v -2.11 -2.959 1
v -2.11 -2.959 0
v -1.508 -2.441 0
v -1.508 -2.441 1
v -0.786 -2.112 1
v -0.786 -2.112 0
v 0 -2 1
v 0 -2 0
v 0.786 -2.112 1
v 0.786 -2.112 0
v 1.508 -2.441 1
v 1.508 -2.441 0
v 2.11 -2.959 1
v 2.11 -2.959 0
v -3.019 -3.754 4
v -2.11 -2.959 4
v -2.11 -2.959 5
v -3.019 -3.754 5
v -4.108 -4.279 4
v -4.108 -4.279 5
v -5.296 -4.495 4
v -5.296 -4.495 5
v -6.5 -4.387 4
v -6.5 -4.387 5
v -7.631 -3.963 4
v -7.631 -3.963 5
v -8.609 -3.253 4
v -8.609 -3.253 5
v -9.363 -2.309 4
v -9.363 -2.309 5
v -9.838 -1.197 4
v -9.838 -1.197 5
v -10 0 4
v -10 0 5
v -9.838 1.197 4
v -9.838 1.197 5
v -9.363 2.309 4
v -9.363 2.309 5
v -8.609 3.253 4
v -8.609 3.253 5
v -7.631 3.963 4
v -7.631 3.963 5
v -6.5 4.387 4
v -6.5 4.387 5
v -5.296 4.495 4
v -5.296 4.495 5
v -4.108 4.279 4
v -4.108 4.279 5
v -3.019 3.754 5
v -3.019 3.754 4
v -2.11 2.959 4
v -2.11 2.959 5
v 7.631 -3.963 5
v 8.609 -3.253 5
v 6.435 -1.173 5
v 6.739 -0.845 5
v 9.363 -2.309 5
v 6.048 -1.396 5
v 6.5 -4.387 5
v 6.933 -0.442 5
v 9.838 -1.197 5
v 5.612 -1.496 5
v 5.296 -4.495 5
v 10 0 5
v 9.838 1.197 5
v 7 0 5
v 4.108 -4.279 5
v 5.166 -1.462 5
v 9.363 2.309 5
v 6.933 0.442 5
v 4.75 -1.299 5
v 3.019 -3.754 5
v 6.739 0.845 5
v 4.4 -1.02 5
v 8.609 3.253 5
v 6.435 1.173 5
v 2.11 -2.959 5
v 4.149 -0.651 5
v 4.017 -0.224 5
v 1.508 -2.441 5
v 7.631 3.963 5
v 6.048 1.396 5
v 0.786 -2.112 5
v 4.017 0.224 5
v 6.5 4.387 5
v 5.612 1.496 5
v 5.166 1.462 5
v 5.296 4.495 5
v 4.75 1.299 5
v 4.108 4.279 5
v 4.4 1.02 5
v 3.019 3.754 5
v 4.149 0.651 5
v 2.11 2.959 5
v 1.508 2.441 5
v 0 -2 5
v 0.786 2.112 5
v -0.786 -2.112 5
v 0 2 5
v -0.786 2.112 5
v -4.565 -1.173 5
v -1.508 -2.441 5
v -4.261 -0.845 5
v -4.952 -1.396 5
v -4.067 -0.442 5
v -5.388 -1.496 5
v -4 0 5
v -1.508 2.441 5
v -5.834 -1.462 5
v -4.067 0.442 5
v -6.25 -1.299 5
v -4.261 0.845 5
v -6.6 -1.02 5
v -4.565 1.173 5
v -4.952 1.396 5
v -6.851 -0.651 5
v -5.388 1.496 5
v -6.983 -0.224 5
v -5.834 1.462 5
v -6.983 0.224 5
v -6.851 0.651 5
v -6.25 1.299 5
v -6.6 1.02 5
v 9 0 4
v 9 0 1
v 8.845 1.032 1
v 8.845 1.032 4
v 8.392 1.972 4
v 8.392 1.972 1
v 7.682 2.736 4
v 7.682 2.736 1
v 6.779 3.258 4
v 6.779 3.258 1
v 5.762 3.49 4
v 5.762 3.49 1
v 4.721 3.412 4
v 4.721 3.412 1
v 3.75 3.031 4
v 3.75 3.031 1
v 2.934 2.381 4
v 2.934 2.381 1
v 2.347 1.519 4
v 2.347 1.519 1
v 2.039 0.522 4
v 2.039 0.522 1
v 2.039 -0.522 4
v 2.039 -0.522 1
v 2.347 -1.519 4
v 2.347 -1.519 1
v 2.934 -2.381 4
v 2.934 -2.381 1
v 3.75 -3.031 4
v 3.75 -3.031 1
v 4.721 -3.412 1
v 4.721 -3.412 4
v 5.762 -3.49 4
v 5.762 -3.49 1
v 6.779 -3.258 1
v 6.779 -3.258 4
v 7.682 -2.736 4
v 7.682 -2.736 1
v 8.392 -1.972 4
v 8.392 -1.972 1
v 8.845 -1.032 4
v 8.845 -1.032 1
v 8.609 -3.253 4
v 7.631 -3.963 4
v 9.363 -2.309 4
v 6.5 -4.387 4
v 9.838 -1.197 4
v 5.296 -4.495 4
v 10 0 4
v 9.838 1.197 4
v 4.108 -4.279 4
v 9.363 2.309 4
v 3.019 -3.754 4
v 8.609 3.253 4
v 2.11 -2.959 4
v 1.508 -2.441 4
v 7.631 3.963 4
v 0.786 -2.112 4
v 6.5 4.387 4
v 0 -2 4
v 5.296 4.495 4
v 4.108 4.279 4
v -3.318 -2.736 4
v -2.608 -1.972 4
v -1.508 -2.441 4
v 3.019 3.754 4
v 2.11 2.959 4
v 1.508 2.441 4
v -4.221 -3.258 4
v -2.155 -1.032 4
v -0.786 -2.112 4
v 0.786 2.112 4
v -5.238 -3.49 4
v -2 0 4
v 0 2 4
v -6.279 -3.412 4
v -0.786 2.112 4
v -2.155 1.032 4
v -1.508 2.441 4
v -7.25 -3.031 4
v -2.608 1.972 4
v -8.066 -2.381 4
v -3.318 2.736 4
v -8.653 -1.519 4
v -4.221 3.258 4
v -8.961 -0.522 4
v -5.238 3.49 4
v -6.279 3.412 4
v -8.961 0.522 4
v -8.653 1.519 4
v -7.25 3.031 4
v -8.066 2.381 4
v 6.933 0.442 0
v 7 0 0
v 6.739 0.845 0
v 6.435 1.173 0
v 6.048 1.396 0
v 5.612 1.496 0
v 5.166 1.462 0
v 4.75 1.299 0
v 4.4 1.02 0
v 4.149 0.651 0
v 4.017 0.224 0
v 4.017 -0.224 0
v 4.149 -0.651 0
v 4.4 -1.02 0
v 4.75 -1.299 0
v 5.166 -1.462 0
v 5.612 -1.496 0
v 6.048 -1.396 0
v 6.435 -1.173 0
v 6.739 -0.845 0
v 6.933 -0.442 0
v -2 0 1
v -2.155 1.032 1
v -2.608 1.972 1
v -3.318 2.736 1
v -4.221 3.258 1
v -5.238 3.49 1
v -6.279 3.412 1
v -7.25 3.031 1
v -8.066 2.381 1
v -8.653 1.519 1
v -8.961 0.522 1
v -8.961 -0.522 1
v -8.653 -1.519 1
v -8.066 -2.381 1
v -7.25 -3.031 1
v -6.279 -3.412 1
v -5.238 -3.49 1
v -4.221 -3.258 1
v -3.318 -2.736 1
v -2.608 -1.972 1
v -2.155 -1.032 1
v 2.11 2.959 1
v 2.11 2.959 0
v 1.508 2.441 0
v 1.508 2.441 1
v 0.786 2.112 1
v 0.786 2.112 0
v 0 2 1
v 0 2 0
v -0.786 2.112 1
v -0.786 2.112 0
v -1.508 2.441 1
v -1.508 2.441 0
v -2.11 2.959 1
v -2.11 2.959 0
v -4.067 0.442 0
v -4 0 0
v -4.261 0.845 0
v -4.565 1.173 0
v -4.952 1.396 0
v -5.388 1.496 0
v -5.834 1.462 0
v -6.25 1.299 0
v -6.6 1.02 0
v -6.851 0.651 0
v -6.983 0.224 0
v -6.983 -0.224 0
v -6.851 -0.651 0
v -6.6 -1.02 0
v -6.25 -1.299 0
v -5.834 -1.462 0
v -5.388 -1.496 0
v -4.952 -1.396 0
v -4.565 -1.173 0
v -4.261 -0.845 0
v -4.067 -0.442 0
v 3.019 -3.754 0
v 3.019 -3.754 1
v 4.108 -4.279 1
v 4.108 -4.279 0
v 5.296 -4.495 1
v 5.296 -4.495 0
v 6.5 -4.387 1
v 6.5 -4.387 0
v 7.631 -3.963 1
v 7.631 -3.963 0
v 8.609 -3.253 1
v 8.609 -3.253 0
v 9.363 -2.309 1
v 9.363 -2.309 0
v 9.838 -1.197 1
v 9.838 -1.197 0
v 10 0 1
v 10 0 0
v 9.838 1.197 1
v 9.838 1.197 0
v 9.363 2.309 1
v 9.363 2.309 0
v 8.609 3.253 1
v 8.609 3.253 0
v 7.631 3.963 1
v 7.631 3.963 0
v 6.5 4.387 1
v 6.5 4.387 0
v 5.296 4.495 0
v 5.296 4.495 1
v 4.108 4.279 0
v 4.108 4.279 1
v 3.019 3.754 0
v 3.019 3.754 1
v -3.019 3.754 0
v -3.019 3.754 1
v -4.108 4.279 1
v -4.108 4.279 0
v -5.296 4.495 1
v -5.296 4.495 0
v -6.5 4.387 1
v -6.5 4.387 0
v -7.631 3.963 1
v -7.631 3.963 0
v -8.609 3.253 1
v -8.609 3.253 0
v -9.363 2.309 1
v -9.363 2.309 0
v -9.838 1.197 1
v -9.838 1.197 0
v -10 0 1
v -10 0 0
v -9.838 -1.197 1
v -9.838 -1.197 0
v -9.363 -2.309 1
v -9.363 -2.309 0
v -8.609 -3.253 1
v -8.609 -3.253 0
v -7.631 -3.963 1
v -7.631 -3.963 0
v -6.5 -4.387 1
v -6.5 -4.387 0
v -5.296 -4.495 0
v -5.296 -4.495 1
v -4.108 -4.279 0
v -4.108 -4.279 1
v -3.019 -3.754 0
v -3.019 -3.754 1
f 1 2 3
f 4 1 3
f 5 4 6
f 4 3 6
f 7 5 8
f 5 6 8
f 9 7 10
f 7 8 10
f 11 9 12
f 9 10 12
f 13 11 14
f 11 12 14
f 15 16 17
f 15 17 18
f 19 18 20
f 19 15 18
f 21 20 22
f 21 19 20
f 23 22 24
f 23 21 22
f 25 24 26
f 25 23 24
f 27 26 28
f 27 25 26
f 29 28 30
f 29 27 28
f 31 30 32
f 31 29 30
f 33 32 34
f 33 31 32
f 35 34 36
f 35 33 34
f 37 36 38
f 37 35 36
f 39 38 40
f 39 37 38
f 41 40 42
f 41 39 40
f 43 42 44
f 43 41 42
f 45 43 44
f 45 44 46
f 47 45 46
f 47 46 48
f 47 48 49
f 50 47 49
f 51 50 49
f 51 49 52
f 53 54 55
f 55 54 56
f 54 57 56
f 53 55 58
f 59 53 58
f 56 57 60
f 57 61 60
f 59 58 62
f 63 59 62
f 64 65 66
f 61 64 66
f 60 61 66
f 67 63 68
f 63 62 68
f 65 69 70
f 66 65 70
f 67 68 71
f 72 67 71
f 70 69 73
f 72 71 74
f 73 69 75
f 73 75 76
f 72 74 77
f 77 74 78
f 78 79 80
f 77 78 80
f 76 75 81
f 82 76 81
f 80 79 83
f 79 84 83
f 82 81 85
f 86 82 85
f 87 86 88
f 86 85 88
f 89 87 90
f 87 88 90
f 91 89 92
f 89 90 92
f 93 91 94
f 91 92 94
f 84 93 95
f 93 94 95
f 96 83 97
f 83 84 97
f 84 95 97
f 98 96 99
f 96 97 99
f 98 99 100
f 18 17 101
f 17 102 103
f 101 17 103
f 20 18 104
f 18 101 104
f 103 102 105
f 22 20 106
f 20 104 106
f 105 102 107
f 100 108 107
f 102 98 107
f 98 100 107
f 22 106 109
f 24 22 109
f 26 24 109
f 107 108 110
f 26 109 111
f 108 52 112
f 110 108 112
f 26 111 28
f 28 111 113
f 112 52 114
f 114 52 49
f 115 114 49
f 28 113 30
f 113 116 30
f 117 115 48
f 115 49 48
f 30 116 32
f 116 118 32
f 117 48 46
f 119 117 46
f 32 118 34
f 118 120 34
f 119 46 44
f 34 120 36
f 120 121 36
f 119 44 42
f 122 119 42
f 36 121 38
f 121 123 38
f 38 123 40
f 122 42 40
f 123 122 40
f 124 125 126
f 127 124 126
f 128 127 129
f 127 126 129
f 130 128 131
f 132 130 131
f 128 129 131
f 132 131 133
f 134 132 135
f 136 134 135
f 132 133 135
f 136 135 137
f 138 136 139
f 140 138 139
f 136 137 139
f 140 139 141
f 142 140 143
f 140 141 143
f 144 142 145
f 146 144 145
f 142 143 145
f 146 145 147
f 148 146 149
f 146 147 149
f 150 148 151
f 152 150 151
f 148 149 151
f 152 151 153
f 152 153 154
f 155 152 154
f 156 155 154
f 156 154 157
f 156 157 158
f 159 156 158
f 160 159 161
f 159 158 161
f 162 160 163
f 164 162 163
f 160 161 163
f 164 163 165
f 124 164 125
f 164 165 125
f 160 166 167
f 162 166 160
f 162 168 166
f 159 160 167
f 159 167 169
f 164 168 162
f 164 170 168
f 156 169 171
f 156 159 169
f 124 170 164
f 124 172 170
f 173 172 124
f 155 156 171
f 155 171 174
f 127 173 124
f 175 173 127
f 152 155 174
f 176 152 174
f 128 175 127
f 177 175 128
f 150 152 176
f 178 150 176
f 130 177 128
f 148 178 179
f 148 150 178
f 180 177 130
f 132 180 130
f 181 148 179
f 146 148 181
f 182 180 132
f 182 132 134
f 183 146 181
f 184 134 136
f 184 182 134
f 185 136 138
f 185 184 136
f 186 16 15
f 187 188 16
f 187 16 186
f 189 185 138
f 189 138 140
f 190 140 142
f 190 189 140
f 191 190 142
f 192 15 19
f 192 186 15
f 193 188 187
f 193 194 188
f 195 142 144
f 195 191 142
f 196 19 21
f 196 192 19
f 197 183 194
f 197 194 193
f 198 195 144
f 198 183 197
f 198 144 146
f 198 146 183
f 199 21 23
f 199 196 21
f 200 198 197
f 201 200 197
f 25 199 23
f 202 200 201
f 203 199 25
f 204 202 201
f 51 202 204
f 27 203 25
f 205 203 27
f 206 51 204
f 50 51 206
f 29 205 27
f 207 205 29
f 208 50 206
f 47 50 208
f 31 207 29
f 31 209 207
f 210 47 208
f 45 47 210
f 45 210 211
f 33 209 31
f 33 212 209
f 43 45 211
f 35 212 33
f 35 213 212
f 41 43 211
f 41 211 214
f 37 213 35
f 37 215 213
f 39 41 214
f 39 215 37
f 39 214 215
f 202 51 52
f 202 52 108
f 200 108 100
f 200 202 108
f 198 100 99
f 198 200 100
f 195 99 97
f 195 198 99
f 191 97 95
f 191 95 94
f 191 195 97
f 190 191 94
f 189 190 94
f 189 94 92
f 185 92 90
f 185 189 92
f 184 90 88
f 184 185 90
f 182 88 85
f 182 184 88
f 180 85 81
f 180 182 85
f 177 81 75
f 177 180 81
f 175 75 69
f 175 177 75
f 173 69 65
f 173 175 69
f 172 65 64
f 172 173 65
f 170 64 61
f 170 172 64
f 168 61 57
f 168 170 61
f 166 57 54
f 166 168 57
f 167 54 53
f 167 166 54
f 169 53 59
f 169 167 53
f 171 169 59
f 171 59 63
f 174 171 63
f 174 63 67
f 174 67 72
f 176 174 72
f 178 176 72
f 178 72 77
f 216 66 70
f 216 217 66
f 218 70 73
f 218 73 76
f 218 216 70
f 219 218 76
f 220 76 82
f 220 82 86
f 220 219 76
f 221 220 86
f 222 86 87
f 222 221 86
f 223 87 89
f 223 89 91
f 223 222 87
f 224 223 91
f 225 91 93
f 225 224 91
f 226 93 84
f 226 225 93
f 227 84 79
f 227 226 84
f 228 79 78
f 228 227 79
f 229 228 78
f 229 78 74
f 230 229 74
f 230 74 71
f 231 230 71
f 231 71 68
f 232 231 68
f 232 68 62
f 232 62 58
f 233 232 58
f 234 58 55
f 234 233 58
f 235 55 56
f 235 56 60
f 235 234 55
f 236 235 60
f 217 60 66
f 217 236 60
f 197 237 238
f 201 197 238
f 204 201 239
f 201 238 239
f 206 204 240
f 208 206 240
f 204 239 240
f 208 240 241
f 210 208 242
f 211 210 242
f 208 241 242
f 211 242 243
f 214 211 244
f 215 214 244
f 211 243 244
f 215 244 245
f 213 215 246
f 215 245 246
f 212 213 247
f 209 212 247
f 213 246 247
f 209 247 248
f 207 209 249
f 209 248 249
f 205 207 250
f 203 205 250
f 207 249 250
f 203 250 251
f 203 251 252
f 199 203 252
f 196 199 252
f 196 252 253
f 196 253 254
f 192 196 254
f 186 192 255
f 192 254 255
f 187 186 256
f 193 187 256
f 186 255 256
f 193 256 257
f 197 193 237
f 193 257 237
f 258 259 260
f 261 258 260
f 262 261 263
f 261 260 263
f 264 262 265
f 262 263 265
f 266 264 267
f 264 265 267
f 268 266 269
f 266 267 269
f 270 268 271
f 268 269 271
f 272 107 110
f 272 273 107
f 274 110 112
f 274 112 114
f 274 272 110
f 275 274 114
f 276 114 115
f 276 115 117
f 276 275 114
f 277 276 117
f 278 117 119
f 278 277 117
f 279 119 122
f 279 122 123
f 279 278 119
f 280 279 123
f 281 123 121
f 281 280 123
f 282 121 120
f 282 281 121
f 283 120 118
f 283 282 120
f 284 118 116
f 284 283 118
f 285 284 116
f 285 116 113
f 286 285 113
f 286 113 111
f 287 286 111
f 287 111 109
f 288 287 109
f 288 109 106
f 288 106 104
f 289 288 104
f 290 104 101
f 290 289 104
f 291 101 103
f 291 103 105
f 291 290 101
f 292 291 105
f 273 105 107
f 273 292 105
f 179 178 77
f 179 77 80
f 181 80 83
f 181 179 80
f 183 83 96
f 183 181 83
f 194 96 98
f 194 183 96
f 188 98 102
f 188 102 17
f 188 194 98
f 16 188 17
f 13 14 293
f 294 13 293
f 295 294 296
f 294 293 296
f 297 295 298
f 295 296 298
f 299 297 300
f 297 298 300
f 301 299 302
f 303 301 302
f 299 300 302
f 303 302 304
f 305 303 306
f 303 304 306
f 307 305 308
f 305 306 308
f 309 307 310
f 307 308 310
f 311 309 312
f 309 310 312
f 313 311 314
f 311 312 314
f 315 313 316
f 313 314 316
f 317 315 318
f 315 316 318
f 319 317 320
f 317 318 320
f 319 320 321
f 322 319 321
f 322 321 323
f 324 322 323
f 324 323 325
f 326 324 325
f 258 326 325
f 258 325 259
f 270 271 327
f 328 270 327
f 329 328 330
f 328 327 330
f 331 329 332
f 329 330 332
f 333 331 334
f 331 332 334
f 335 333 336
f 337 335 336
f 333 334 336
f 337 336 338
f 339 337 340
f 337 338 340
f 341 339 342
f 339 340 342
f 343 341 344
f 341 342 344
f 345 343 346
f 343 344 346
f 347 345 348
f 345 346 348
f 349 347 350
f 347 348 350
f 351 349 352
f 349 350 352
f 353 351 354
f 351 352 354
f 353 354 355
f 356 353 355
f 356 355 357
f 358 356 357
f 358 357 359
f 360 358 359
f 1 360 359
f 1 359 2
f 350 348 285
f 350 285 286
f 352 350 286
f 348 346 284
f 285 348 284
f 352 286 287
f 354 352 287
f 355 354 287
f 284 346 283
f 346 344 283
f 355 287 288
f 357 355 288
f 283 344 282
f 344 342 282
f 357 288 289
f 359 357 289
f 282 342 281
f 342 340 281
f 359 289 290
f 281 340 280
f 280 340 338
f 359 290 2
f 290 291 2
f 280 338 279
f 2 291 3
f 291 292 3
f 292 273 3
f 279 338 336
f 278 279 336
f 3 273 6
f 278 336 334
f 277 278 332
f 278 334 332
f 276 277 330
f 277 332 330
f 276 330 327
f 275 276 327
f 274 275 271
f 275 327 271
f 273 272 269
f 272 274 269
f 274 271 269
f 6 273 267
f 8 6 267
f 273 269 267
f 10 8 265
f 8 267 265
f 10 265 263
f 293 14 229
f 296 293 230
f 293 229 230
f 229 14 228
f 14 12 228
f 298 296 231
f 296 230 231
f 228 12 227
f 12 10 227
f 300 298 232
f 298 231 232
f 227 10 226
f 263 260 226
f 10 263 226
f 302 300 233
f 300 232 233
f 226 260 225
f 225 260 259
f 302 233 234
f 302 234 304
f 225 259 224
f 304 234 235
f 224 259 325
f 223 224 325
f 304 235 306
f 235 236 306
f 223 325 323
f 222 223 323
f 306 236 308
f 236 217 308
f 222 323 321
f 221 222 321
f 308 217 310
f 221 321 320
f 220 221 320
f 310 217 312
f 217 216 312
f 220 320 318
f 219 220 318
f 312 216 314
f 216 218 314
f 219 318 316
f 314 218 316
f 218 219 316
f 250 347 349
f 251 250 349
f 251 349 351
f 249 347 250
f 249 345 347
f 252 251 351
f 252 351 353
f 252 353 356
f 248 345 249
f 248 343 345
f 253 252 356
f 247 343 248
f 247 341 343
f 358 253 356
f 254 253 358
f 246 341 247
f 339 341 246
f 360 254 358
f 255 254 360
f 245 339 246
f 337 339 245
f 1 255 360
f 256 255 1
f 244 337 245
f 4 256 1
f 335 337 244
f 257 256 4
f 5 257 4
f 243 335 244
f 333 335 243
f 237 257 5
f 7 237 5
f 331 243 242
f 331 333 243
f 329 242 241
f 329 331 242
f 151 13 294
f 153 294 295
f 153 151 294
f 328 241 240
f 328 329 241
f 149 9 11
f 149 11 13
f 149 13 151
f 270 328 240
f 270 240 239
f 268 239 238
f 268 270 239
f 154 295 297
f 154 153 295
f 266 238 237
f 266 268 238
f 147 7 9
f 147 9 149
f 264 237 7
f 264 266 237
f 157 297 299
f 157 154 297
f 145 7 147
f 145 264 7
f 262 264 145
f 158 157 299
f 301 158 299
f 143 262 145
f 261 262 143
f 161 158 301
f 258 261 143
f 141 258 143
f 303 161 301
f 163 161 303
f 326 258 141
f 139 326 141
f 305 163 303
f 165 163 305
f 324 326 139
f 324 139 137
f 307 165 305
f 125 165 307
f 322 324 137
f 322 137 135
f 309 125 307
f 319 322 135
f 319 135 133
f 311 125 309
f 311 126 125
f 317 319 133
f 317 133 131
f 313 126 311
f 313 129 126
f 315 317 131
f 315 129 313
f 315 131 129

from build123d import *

# Parameters (mm, degrees)
CROQUIS1_R              = 1.5
SALIENTE_EXTRUIR1_DEPTH = 1
CROQUIS2_R              = 3.5
CROQUIS2_R_2            = 1.5
SALIENTE_EXTRUIR2_DEPTH = 3
CROQUIS3_R              = 1.5
SALIENTE_EXTRUIR3_DEPTH = 1


with BuildPart() as part:
    # Croquis1 → Saliente-Extruir1 (new body)
    with BuildSketch(Plane.XY):
        with BuildLine():
            ThreePointArc((2.109589041, -2.95890411), (10, 0), (2.109589041, 2.95890411))
            ThreePointArc((2.109589041, 2.95890411), (0, 2), (-2.109589041, 2.95890411))
            ThreePointArc((-2.109589041, 2.95890411), (-10, 0), (-2.109589041, -2.95890411))
            ThreePointArc((-2.109589041, -2.95890411), (0, -2), (2.109589041, -2.95890411))
        make_face()
        with Locations((-5.5, 0)):
            Circle(CROQUIS1_R, mode=Mode.SUBTRACT)
        with Locations((5.5, 0)):
            Circle(CROQUIS1_R, mode=Mode.SUBTRACT)
    extrude(amount=SALIENTE_EXTRUIR1_DEPTH)

    # Croquis2 → Saliente-Extruir2 (add)
    with BuildSketch(Plane.XY.offset(1)):
        with Locations((-5.5, 0)):
            Circle(CROQUIS2_R)
        with Locations((-5.5, 0)):
            Circle(CROQUIS2_R_2, mode=Mode.SUBTRACT)
        with Locations((5.5, 0)):
            Circle(CROQUIS2_R)
        with Locations((5.5, 0)):
            Circle(CROQUIS2_R_2, mode=Mode.SUBTRACT)
    extrude(amount=SALIENTE_EXTRUIR2_DEPTH)

    # Croquis3 → Saliente-Extruir3 (add)
    with BuildSketch(Plane.XY.offset(4)):
        with BuildLine():
            ThreePointArc((-2.109589041, 2.95890411), (0, 2), (2.109589041, 2.95890411))
            ThreePointArc((2.109589041, 2.95890411), (10, 0), (2.109589041, -2.95890411))
            ThreePointArc((2.109589041, -2.95890411), (0, -2), (-2.109589041, -2.95890411))
            ThreePointArc((-2.109589041, -2.95890411), (-10, 0), (-2.109589041, 2.95890411))
        make_face()
        with Locations((-5.5, 0)):
            Circle(CROQUIS3_R, mode=Mode.SUBTRACT)
        with Locations((5.5, 0)):
            Circle(CROQUIS3_R, mode=Mode.SUBTRACT)
    extrude(amount=SALIENTE_EXTRUIR3_DEPTH)


solid = part.part
